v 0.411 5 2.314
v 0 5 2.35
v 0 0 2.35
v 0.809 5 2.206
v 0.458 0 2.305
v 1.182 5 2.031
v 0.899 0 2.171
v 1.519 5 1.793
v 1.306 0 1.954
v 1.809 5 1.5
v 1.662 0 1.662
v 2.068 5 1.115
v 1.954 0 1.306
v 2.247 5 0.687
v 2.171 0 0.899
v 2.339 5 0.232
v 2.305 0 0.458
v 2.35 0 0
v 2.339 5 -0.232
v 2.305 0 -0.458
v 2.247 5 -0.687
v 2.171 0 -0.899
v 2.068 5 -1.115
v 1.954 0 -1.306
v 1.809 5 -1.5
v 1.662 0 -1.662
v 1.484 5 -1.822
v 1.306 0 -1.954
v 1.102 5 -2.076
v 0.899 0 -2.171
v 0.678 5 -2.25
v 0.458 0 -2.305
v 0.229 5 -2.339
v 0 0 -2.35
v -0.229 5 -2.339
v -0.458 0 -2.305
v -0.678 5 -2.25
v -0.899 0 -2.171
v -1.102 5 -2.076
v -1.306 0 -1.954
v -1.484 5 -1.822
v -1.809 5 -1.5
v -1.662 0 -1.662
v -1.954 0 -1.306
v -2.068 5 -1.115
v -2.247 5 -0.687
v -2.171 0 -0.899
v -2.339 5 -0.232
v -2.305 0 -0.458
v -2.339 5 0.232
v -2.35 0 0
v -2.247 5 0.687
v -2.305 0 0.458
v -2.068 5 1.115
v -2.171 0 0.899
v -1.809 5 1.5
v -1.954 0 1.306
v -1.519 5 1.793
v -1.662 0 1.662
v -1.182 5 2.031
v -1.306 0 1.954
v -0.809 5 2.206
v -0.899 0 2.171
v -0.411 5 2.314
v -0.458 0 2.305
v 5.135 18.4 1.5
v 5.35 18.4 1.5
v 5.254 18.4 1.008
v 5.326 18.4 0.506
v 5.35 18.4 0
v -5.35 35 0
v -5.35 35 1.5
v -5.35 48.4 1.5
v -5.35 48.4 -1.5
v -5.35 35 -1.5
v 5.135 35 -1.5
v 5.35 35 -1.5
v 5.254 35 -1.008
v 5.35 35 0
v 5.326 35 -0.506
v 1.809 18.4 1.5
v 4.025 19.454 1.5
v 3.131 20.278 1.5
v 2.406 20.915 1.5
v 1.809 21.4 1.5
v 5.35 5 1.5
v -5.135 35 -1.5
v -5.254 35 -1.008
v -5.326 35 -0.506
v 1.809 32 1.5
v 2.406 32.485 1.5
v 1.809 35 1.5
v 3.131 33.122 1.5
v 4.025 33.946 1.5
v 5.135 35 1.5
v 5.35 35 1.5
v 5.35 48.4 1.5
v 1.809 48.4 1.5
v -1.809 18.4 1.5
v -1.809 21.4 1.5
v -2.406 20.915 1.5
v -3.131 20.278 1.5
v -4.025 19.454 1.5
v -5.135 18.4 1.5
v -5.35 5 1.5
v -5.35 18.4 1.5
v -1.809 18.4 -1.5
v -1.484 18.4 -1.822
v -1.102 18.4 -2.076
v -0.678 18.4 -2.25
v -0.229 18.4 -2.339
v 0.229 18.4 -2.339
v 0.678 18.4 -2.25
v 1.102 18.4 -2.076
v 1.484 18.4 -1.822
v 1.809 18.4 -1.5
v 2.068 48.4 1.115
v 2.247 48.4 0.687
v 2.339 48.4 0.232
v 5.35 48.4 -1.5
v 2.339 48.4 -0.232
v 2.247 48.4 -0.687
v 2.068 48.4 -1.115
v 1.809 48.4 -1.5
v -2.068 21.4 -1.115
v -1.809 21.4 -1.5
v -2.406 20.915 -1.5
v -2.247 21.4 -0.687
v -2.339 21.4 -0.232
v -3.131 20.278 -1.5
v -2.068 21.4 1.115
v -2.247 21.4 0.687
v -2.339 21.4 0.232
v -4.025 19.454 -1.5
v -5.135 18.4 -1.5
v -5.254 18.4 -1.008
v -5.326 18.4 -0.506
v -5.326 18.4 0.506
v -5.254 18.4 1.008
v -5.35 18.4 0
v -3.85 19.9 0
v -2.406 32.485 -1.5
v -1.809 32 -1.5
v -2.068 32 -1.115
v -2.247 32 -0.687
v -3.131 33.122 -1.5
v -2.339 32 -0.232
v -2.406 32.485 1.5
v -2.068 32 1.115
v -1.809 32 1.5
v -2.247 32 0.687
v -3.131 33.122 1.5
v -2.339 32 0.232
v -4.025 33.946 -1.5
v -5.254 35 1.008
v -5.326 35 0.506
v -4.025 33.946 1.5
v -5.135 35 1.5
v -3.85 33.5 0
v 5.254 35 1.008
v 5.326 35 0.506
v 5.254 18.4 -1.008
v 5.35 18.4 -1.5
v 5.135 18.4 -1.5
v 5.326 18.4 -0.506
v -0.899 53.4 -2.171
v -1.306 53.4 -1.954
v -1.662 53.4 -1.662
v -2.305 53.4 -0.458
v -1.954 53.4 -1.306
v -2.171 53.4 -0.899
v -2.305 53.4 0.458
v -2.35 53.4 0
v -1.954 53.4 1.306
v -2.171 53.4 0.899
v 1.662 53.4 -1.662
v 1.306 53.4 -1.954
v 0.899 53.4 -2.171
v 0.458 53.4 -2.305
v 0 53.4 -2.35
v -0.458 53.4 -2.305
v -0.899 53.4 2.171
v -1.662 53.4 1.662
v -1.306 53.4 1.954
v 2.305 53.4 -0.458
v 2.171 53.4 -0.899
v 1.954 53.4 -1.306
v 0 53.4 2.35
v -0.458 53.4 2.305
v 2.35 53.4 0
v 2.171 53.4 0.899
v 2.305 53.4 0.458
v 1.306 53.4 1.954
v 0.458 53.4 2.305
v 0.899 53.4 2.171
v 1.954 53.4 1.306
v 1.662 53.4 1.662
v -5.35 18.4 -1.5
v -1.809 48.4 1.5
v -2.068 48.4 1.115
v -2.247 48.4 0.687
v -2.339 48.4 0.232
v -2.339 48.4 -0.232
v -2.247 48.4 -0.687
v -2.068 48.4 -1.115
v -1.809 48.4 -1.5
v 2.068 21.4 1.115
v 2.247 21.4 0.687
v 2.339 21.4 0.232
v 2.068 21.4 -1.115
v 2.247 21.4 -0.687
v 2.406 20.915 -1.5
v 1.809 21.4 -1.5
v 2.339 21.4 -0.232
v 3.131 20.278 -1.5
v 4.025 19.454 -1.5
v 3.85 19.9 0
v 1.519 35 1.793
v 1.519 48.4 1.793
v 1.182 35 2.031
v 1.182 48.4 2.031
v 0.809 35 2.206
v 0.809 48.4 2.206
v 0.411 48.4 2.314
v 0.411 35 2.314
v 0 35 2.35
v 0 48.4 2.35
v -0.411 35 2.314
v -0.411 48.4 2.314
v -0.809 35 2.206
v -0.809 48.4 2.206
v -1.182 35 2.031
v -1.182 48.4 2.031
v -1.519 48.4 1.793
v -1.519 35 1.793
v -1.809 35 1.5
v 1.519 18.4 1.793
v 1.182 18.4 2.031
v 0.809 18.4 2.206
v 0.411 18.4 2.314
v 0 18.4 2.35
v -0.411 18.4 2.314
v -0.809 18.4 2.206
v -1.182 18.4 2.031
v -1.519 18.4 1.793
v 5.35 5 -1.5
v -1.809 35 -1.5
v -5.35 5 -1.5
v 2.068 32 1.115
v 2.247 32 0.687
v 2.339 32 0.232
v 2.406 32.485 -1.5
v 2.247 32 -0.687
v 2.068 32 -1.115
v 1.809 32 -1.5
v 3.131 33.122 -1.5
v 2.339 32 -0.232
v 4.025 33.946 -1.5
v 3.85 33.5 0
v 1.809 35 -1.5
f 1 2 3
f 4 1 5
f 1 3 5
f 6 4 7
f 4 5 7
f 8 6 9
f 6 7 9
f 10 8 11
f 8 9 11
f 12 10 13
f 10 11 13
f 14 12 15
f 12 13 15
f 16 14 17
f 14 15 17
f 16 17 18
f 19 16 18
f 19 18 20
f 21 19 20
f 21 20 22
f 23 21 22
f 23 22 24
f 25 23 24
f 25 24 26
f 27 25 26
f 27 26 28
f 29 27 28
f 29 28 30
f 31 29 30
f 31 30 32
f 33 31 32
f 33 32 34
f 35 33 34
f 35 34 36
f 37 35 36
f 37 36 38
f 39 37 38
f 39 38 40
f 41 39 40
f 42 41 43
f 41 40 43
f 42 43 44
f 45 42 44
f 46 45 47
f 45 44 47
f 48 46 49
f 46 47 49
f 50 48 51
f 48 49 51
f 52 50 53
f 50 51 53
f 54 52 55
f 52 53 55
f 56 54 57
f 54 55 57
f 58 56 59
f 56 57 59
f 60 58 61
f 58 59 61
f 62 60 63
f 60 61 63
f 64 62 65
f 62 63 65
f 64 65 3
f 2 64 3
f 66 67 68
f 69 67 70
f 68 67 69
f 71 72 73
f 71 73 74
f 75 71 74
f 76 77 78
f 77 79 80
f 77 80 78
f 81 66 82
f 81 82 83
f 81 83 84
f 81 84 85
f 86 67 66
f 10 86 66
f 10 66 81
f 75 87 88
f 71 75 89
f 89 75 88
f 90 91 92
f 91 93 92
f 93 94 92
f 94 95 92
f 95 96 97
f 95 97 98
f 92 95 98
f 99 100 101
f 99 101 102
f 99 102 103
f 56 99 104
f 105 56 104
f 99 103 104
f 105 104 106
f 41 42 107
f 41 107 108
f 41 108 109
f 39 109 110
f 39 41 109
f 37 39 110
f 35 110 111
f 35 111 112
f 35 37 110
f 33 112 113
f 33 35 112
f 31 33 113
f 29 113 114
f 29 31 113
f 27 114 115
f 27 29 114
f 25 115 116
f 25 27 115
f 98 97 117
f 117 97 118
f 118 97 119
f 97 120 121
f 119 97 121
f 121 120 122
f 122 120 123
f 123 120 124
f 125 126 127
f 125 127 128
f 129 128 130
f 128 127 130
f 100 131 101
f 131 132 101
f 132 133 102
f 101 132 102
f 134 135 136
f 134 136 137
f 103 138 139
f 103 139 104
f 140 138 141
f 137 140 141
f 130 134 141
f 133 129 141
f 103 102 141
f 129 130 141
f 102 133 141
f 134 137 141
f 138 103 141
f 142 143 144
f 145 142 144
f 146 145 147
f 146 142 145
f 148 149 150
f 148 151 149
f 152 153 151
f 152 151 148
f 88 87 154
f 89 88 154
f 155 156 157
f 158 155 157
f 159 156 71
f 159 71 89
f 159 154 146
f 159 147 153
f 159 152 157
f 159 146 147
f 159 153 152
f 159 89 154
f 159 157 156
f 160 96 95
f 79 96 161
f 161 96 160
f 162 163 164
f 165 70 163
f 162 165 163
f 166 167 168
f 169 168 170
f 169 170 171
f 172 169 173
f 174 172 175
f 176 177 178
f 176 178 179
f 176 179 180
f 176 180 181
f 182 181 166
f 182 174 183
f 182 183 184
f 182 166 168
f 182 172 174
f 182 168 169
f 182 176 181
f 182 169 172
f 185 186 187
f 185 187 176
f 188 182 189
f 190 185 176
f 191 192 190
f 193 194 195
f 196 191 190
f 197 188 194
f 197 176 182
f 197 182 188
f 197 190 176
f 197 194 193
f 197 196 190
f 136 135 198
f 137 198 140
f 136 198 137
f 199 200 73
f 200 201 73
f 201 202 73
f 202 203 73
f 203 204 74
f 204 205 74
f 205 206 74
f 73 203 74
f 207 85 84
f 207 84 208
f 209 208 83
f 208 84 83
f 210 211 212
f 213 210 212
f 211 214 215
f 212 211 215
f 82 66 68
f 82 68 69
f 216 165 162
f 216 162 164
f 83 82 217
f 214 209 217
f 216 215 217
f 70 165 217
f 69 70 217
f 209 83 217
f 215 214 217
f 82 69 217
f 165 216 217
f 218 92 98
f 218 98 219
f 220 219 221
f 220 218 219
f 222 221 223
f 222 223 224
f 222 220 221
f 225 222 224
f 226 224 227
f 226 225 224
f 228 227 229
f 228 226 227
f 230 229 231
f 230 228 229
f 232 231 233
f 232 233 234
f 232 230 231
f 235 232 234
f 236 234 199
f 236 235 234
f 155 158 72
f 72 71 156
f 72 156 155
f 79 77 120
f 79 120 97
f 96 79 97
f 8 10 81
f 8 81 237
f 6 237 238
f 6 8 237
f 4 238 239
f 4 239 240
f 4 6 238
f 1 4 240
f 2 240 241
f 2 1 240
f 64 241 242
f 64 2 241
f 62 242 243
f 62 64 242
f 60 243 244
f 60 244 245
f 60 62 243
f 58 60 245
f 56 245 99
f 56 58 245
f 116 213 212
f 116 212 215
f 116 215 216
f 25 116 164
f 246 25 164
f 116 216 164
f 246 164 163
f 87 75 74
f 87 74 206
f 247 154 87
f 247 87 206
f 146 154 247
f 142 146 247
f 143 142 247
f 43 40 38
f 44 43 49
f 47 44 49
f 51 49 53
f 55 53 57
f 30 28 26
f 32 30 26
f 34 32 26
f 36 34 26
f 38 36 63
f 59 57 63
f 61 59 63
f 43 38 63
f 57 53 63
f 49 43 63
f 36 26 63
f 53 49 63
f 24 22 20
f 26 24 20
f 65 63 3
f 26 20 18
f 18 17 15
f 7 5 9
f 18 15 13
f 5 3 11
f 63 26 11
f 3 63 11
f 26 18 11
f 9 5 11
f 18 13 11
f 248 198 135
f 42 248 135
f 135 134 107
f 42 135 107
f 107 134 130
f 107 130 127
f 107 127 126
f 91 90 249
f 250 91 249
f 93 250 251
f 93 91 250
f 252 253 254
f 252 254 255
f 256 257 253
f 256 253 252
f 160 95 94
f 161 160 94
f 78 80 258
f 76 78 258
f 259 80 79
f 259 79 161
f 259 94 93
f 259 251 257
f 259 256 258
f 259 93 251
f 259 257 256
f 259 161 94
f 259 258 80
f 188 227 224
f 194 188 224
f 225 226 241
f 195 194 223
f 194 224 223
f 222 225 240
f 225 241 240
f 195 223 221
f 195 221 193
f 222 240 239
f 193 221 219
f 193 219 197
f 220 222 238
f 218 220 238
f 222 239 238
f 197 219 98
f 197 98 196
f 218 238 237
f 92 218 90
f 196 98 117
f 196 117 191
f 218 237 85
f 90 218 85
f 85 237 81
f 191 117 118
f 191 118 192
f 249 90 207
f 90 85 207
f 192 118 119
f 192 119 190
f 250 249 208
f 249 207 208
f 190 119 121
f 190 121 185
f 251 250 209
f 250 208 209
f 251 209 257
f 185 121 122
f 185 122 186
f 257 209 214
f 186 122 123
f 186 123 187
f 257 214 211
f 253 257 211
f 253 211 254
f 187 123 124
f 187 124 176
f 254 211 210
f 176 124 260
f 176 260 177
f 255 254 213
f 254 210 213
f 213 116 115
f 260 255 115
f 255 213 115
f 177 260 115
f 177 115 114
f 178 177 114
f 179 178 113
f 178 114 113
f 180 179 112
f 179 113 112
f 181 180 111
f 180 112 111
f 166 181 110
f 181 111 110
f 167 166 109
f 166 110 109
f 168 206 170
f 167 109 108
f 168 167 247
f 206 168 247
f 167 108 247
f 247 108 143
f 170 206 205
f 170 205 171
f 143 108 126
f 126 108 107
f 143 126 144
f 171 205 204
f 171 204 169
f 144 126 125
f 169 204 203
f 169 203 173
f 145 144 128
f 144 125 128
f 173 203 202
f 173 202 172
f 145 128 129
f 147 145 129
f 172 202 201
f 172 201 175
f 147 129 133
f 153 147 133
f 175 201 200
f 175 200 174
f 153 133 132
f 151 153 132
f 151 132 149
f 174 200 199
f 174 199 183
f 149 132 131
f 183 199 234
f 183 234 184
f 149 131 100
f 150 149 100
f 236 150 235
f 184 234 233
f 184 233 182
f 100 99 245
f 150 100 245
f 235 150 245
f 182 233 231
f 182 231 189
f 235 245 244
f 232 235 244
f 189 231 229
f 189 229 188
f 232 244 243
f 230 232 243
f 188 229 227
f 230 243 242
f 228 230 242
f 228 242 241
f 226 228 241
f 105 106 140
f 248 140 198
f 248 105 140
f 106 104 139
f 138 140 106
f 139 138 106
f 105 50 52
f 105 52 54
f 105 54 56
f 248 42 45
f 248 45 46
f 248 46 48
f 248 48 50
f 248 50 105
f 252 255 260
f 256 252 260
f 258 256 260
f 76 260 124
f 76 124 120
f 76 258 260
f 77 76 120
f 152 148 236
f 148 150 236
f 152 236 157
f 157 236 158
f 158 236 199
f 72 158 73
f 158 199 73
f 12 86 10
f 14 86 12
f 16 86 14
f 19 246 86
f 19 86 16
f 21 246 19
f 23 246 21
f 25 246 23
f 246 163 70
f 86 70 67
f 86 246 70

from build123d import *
from build123d.topology import SkipClean

# Parameters (mm, degrees)
SKETCH1_R           = 2.35
BOSS_EXTRUDE1_DEPTH = 5
BOSS_EXTRUDE2_DEPTH = 13.4
BOSS_EXTRUDE3_START = 18.4
SKETCH1_2_R         = 2.35
BOSS_EXTRUDE3_DEPTH = 16.6
BOSS_EXTRUDE4_START = 30
SKETCH2_2_R         = 2.35
BOSS_EXTRUDE4_DEPTH = 13.4
BOSS_EXTRUDE5_START = 48.4
SKETCH1_3_R         = 2.35
BOSS_EXTRUDE5_DEPTH = 5
CHAMFER1_SIZE       = 3


with BuildPart() as part:
    # Sketch1 → Boss-Extrude1 (new body)
    with BuildSketch(Plane(origin=(0, 0, 0), x_dir=(1, 0, 0), z_dir=(0, 1, 0))):
        with Locations(Location((0, 0, 0), (0, 0, 270))):
            Circle(SKETCH1_R)
    extrude(amount=BOSS_EXTRUDE1_DEPTH)

    # Sketch2 → Boss-Extrude2 (add)
    with SkipClean():  # the faces are left unmerged after this step: merging them gives an invalid solid
        with BuildSketch(Plane(origin=(0, 5, 0), x_dir=(1, 0, 0), z_dir=(0, 1, 0))):
            with BuildLine():
                Line((-1.809005, -1.5), (-5.35, -1.5))
                Line((-5.35, -1.5), (-5.35, 1.5))
                Line((-5.35, 1.5), (-1.809005, 1.5))
                ThreePointArc((-1.809005, 1.5), (0, 2.35), (1.809005, 1.5))
                Line((1.809005, 1.5), (5.35, 1.5))
                Line((5.35, 1.5), (5.35, -1.5))
                Line((5.35, -1.5), (1.809005, -1.5))
                ThreePointArc((1.809005, -1.5), (0, -2.35), (-1.809005, -1.5))
            make_face()
        extrude(amount=BOSS_EXTRUDE2_DEPTH)

    # Sketch1<2> → Boss-Extrude3 (add)
    with SkipClean():  # the faces are left unmerged after this step: merging them gives an invalid solid
        with BuildSketch(Plane(origin=(0, 0, 0), x_dir=(1, 0, 0), z_dir=(0, 1, 0)).offset(BOSS_EXTRUDE3_START)):
            with Locations(Location((0, 0, 0), (0, 0, 270))):
                Circle(SKETCH1_2_R)
        extrude(amount=BOSS_EXTRUDE3_DEPTH)

    # Sketch2<2> → Boss-Extrude4 (add)
    with SkipClean():  # the faces are left unmerged after this step: merging them gives an invalid solid
        with BuildSketch(Plane(origin=(0, 5, 0), x_dir=(1, 0, 0), z_dir=(0, 1, 0)).offset(BOSS_EXTRUDE4_START)):
            with Locations(Location((0, 0, 0), (0, 0, 140.334987))):
                Circle(SKETCH2_2_R)
            with BuildLine():
                Line((-1.809005, -1.5), (-5.35, -1.5))
                Line((-5.35, -1.5), (-5.35, 1.5))
                Line((-5.35, 1.5), (-1.809005, 1.5))
                ThreePointArc((-1.809005, 1.5), (0, 2.35), (1.809005, 1.5))
                Line((1.809005, 1.5), (5.35, 1.5))
                Line((5.35, 1.5), (5.35, -1.5))
                Line((5.35, -1.5), (1.809005, -1.5))
                ThreePointArc((1.809005, -1.5), (0, -2.35), (-1.809005, -1.5))
            make_face()
        extrude(amount=BOSS_EXTRUDE4_DEPTH)

    # Sketch1<3> → Boss-Extrude5 (add)
    with SkipClean():  # the faces are left unmerged after this step: merging them gives an invalid solid
        with BuildSketch(Plane(origin=(0, 0, 0), x_dir=(1, 0, 0), z_dir=(0, 1, 0)).offset(BOSS_EXTRUDE5_START)):
            with Locations(Location((0, 0, 0), (0, 0, 270))):
                Circle(SKETCH1_3_R)
        extrude(amount=BOSS_EXTRUDE5_DEPTH)

    # Chamfer1
    # the kernel refuses this chamfer: 3 mm, written as the material it adds along each edge
    with BuildSketch(Plane(origin=(0, 18.4, 0), x_dir=(0.9999950652018581, 0, -0.0031415874858791225), z_dir=(0.0031415874858791225, 0, 0.9999950652018581))) as chamfer1_piece_1_section:
        Polygon((2.35, CHAMFER1_SIZE), (2.35 + CHAMFER1_SIZE, 0), (2.35, 0), align=None)
    chamfer1_piece_1 = revolve(axis=Axis((0, 18.4, 0), (0, 1, 0)), revolution_arc=359.64, mode=Mode.PRIVATE)
    chamfer1_piece_1 = split(chamfer1_piece_1, bisect_by=Plane(origin=(3.194483, 19.397878, 1.5), z_dir=(0, 0, -1)), keep=Keep.TOP, mode=Mode.PRIVATE)
    chamfer1_piece_1 = split(chamfer1_piece_1, bisect_by=Plane(origin=(3.194483, 19.397878, -1.5), z_dir=(0, 0, 1)), keep=Keep.TOP, mode=Mode.PRIVATE)
    chamfer1_piece_1 = split(chamfer1_piece_1, bisect_by=Plane(origin=(-5.35, 19.397878, -0.77195), z_dir=(1, 0, 0)), keep=Keep.TOP, mode=Mode.PRIVATE)
    add(chamfer1_piece_1)
    with BuildSketch(Plane(origin=(0, 18.4, 0), x_dir=(-0.9999950652018581, 0, 0.0031415874858796884), z_dir=(-0.0031415874858796884, 0, -0.9999950652018581))) as chamfer1_piece_2_section:
        Polygon((2.35, CHAMFER1_SIZE), (2.35 + CHAMFER1_SIZE, 0), (2.35, 0), align=None)
    chamfer1_piece_2 = revolve(axis=Axis((0, 18.4, 0), (0, 1, 0)), revolution_arc=359.64, mode=Mode.PRIVATE)
    chamfer1_piece_2 = split(chamfer1_piece_2, bisect_by=Plane(origin=(-3.194483, 19.397878, 1.5), z_dir=(0, 0, -1)), keep=Keep.TOP, mode=Mode.PRIVATE)
    chamfer1_piece_2 = split(chamfer1_piece_2, bisect_by=Plane(origin=(-3.194483, 19.397878, -1.5), z_dir=(0, 0, 1)), keep=Keep.TOP, mode=Mode.PRIVATE)
    chamfer1_piece_2 = split(chamfer1_piece_2, bisect_by=Plane(origin=(5.35, 19.397878, 0.77195), z_dir=(-1, 0, 0)), keep=Keep.TOP, mode=Mode.PRIVATE)
    add(chamfer1_piece_2)
    with BuildSketch(Plane(origin=(0, 35, 0), x_dir=(-0.9999950652018581, 0, 0.0031415874858796884), z_dir=(-0.0031415874858796884, 0, -0.9999950652018581))) as chamfer1_piece_3_section:
        Polygon((2.35, -CHAMFER1_SIZE), (2.35 + CHAMFER1_SIZE, 0), (2.35, 0), align=None)
    chamfer1_piece_3 = revolve(axis=Axis((0, 35, 0), (0, 1, 0)), revolution_arc=359.64, mode=Mode.PRIVATE)
    chamfer1_piece_3 = split(chamfer1_piece_3, bisect_by=Plane(origin=(-3.194483, 34.002122, 1.5), z_dir=(0, 0, -1)), keep=Keep.TOP, mode=Mode.PRIVATE)
    chamfer1_piece_3 = split(chamfer1_piece_3, bisect_by=Plane(origin=(-3.194483, 34.002122, -1.5), z_dir=(0, 0, 1)), keep=Keep.TOP, mode=Mode.PRIVATE)
    chamfer1_piece_3 = split(chamfer1_piece_3, bisect_by=Plane(origin=(5.35, 34.002122, 0.77195), z_dir=(-1, 0, 0)), keep=Keep.TOP, mode=Mode.PRIVATE)
    add(chamfer1_piece_3)
    with BuildSketch(Plane(origin=(0, 35, 0), x_dir=(0.9999950652018625, 0, -0.0031415874844589325), z_dir=(0.0031415874844589325, 0, 0.9999950652018625))) as chamfer1_piece_4_section:
        Polygon((2.35, -CHAMFER1_SIZE), (2.35 + CHAMFER1_SIZE, 0), (2.35, 0), align=None)
    chamfer1_piece_4 = revolve(axis=Axis((0, 35, 0), (0, 1, 0)), revolution_arc=359.64, mode=Mode.PRIVATE)
    chamfer1_piece_4 = split(chamfer1_piece_4, bisect_by=Plane(origin=(3.194483, 34.002122, 1.5), z_dir=(0, 0, -1)), keep=Keep.TOP, mode=Mode.PRIVATE)
    chamfer1_piece_4 = split(chamfer1_piece_4, bisect_by=Plane(origin=(-5.35, 34.002122, -0.77195), z_dir=(1, 0, 0)), keep=Keep.TOP, mode=Mode.PRIVATE)
    chamfer1_piece_4 = split(chamfer1_piece_4, bisect_by=Plane(origin=(3.194483, 34.002122, -1.5), z_dir=(0, 0, 1)), keep=Keep.TOP, mode=Mode.PRIVATE)
    add(chamfer1_piece_4)


solid = part.part
